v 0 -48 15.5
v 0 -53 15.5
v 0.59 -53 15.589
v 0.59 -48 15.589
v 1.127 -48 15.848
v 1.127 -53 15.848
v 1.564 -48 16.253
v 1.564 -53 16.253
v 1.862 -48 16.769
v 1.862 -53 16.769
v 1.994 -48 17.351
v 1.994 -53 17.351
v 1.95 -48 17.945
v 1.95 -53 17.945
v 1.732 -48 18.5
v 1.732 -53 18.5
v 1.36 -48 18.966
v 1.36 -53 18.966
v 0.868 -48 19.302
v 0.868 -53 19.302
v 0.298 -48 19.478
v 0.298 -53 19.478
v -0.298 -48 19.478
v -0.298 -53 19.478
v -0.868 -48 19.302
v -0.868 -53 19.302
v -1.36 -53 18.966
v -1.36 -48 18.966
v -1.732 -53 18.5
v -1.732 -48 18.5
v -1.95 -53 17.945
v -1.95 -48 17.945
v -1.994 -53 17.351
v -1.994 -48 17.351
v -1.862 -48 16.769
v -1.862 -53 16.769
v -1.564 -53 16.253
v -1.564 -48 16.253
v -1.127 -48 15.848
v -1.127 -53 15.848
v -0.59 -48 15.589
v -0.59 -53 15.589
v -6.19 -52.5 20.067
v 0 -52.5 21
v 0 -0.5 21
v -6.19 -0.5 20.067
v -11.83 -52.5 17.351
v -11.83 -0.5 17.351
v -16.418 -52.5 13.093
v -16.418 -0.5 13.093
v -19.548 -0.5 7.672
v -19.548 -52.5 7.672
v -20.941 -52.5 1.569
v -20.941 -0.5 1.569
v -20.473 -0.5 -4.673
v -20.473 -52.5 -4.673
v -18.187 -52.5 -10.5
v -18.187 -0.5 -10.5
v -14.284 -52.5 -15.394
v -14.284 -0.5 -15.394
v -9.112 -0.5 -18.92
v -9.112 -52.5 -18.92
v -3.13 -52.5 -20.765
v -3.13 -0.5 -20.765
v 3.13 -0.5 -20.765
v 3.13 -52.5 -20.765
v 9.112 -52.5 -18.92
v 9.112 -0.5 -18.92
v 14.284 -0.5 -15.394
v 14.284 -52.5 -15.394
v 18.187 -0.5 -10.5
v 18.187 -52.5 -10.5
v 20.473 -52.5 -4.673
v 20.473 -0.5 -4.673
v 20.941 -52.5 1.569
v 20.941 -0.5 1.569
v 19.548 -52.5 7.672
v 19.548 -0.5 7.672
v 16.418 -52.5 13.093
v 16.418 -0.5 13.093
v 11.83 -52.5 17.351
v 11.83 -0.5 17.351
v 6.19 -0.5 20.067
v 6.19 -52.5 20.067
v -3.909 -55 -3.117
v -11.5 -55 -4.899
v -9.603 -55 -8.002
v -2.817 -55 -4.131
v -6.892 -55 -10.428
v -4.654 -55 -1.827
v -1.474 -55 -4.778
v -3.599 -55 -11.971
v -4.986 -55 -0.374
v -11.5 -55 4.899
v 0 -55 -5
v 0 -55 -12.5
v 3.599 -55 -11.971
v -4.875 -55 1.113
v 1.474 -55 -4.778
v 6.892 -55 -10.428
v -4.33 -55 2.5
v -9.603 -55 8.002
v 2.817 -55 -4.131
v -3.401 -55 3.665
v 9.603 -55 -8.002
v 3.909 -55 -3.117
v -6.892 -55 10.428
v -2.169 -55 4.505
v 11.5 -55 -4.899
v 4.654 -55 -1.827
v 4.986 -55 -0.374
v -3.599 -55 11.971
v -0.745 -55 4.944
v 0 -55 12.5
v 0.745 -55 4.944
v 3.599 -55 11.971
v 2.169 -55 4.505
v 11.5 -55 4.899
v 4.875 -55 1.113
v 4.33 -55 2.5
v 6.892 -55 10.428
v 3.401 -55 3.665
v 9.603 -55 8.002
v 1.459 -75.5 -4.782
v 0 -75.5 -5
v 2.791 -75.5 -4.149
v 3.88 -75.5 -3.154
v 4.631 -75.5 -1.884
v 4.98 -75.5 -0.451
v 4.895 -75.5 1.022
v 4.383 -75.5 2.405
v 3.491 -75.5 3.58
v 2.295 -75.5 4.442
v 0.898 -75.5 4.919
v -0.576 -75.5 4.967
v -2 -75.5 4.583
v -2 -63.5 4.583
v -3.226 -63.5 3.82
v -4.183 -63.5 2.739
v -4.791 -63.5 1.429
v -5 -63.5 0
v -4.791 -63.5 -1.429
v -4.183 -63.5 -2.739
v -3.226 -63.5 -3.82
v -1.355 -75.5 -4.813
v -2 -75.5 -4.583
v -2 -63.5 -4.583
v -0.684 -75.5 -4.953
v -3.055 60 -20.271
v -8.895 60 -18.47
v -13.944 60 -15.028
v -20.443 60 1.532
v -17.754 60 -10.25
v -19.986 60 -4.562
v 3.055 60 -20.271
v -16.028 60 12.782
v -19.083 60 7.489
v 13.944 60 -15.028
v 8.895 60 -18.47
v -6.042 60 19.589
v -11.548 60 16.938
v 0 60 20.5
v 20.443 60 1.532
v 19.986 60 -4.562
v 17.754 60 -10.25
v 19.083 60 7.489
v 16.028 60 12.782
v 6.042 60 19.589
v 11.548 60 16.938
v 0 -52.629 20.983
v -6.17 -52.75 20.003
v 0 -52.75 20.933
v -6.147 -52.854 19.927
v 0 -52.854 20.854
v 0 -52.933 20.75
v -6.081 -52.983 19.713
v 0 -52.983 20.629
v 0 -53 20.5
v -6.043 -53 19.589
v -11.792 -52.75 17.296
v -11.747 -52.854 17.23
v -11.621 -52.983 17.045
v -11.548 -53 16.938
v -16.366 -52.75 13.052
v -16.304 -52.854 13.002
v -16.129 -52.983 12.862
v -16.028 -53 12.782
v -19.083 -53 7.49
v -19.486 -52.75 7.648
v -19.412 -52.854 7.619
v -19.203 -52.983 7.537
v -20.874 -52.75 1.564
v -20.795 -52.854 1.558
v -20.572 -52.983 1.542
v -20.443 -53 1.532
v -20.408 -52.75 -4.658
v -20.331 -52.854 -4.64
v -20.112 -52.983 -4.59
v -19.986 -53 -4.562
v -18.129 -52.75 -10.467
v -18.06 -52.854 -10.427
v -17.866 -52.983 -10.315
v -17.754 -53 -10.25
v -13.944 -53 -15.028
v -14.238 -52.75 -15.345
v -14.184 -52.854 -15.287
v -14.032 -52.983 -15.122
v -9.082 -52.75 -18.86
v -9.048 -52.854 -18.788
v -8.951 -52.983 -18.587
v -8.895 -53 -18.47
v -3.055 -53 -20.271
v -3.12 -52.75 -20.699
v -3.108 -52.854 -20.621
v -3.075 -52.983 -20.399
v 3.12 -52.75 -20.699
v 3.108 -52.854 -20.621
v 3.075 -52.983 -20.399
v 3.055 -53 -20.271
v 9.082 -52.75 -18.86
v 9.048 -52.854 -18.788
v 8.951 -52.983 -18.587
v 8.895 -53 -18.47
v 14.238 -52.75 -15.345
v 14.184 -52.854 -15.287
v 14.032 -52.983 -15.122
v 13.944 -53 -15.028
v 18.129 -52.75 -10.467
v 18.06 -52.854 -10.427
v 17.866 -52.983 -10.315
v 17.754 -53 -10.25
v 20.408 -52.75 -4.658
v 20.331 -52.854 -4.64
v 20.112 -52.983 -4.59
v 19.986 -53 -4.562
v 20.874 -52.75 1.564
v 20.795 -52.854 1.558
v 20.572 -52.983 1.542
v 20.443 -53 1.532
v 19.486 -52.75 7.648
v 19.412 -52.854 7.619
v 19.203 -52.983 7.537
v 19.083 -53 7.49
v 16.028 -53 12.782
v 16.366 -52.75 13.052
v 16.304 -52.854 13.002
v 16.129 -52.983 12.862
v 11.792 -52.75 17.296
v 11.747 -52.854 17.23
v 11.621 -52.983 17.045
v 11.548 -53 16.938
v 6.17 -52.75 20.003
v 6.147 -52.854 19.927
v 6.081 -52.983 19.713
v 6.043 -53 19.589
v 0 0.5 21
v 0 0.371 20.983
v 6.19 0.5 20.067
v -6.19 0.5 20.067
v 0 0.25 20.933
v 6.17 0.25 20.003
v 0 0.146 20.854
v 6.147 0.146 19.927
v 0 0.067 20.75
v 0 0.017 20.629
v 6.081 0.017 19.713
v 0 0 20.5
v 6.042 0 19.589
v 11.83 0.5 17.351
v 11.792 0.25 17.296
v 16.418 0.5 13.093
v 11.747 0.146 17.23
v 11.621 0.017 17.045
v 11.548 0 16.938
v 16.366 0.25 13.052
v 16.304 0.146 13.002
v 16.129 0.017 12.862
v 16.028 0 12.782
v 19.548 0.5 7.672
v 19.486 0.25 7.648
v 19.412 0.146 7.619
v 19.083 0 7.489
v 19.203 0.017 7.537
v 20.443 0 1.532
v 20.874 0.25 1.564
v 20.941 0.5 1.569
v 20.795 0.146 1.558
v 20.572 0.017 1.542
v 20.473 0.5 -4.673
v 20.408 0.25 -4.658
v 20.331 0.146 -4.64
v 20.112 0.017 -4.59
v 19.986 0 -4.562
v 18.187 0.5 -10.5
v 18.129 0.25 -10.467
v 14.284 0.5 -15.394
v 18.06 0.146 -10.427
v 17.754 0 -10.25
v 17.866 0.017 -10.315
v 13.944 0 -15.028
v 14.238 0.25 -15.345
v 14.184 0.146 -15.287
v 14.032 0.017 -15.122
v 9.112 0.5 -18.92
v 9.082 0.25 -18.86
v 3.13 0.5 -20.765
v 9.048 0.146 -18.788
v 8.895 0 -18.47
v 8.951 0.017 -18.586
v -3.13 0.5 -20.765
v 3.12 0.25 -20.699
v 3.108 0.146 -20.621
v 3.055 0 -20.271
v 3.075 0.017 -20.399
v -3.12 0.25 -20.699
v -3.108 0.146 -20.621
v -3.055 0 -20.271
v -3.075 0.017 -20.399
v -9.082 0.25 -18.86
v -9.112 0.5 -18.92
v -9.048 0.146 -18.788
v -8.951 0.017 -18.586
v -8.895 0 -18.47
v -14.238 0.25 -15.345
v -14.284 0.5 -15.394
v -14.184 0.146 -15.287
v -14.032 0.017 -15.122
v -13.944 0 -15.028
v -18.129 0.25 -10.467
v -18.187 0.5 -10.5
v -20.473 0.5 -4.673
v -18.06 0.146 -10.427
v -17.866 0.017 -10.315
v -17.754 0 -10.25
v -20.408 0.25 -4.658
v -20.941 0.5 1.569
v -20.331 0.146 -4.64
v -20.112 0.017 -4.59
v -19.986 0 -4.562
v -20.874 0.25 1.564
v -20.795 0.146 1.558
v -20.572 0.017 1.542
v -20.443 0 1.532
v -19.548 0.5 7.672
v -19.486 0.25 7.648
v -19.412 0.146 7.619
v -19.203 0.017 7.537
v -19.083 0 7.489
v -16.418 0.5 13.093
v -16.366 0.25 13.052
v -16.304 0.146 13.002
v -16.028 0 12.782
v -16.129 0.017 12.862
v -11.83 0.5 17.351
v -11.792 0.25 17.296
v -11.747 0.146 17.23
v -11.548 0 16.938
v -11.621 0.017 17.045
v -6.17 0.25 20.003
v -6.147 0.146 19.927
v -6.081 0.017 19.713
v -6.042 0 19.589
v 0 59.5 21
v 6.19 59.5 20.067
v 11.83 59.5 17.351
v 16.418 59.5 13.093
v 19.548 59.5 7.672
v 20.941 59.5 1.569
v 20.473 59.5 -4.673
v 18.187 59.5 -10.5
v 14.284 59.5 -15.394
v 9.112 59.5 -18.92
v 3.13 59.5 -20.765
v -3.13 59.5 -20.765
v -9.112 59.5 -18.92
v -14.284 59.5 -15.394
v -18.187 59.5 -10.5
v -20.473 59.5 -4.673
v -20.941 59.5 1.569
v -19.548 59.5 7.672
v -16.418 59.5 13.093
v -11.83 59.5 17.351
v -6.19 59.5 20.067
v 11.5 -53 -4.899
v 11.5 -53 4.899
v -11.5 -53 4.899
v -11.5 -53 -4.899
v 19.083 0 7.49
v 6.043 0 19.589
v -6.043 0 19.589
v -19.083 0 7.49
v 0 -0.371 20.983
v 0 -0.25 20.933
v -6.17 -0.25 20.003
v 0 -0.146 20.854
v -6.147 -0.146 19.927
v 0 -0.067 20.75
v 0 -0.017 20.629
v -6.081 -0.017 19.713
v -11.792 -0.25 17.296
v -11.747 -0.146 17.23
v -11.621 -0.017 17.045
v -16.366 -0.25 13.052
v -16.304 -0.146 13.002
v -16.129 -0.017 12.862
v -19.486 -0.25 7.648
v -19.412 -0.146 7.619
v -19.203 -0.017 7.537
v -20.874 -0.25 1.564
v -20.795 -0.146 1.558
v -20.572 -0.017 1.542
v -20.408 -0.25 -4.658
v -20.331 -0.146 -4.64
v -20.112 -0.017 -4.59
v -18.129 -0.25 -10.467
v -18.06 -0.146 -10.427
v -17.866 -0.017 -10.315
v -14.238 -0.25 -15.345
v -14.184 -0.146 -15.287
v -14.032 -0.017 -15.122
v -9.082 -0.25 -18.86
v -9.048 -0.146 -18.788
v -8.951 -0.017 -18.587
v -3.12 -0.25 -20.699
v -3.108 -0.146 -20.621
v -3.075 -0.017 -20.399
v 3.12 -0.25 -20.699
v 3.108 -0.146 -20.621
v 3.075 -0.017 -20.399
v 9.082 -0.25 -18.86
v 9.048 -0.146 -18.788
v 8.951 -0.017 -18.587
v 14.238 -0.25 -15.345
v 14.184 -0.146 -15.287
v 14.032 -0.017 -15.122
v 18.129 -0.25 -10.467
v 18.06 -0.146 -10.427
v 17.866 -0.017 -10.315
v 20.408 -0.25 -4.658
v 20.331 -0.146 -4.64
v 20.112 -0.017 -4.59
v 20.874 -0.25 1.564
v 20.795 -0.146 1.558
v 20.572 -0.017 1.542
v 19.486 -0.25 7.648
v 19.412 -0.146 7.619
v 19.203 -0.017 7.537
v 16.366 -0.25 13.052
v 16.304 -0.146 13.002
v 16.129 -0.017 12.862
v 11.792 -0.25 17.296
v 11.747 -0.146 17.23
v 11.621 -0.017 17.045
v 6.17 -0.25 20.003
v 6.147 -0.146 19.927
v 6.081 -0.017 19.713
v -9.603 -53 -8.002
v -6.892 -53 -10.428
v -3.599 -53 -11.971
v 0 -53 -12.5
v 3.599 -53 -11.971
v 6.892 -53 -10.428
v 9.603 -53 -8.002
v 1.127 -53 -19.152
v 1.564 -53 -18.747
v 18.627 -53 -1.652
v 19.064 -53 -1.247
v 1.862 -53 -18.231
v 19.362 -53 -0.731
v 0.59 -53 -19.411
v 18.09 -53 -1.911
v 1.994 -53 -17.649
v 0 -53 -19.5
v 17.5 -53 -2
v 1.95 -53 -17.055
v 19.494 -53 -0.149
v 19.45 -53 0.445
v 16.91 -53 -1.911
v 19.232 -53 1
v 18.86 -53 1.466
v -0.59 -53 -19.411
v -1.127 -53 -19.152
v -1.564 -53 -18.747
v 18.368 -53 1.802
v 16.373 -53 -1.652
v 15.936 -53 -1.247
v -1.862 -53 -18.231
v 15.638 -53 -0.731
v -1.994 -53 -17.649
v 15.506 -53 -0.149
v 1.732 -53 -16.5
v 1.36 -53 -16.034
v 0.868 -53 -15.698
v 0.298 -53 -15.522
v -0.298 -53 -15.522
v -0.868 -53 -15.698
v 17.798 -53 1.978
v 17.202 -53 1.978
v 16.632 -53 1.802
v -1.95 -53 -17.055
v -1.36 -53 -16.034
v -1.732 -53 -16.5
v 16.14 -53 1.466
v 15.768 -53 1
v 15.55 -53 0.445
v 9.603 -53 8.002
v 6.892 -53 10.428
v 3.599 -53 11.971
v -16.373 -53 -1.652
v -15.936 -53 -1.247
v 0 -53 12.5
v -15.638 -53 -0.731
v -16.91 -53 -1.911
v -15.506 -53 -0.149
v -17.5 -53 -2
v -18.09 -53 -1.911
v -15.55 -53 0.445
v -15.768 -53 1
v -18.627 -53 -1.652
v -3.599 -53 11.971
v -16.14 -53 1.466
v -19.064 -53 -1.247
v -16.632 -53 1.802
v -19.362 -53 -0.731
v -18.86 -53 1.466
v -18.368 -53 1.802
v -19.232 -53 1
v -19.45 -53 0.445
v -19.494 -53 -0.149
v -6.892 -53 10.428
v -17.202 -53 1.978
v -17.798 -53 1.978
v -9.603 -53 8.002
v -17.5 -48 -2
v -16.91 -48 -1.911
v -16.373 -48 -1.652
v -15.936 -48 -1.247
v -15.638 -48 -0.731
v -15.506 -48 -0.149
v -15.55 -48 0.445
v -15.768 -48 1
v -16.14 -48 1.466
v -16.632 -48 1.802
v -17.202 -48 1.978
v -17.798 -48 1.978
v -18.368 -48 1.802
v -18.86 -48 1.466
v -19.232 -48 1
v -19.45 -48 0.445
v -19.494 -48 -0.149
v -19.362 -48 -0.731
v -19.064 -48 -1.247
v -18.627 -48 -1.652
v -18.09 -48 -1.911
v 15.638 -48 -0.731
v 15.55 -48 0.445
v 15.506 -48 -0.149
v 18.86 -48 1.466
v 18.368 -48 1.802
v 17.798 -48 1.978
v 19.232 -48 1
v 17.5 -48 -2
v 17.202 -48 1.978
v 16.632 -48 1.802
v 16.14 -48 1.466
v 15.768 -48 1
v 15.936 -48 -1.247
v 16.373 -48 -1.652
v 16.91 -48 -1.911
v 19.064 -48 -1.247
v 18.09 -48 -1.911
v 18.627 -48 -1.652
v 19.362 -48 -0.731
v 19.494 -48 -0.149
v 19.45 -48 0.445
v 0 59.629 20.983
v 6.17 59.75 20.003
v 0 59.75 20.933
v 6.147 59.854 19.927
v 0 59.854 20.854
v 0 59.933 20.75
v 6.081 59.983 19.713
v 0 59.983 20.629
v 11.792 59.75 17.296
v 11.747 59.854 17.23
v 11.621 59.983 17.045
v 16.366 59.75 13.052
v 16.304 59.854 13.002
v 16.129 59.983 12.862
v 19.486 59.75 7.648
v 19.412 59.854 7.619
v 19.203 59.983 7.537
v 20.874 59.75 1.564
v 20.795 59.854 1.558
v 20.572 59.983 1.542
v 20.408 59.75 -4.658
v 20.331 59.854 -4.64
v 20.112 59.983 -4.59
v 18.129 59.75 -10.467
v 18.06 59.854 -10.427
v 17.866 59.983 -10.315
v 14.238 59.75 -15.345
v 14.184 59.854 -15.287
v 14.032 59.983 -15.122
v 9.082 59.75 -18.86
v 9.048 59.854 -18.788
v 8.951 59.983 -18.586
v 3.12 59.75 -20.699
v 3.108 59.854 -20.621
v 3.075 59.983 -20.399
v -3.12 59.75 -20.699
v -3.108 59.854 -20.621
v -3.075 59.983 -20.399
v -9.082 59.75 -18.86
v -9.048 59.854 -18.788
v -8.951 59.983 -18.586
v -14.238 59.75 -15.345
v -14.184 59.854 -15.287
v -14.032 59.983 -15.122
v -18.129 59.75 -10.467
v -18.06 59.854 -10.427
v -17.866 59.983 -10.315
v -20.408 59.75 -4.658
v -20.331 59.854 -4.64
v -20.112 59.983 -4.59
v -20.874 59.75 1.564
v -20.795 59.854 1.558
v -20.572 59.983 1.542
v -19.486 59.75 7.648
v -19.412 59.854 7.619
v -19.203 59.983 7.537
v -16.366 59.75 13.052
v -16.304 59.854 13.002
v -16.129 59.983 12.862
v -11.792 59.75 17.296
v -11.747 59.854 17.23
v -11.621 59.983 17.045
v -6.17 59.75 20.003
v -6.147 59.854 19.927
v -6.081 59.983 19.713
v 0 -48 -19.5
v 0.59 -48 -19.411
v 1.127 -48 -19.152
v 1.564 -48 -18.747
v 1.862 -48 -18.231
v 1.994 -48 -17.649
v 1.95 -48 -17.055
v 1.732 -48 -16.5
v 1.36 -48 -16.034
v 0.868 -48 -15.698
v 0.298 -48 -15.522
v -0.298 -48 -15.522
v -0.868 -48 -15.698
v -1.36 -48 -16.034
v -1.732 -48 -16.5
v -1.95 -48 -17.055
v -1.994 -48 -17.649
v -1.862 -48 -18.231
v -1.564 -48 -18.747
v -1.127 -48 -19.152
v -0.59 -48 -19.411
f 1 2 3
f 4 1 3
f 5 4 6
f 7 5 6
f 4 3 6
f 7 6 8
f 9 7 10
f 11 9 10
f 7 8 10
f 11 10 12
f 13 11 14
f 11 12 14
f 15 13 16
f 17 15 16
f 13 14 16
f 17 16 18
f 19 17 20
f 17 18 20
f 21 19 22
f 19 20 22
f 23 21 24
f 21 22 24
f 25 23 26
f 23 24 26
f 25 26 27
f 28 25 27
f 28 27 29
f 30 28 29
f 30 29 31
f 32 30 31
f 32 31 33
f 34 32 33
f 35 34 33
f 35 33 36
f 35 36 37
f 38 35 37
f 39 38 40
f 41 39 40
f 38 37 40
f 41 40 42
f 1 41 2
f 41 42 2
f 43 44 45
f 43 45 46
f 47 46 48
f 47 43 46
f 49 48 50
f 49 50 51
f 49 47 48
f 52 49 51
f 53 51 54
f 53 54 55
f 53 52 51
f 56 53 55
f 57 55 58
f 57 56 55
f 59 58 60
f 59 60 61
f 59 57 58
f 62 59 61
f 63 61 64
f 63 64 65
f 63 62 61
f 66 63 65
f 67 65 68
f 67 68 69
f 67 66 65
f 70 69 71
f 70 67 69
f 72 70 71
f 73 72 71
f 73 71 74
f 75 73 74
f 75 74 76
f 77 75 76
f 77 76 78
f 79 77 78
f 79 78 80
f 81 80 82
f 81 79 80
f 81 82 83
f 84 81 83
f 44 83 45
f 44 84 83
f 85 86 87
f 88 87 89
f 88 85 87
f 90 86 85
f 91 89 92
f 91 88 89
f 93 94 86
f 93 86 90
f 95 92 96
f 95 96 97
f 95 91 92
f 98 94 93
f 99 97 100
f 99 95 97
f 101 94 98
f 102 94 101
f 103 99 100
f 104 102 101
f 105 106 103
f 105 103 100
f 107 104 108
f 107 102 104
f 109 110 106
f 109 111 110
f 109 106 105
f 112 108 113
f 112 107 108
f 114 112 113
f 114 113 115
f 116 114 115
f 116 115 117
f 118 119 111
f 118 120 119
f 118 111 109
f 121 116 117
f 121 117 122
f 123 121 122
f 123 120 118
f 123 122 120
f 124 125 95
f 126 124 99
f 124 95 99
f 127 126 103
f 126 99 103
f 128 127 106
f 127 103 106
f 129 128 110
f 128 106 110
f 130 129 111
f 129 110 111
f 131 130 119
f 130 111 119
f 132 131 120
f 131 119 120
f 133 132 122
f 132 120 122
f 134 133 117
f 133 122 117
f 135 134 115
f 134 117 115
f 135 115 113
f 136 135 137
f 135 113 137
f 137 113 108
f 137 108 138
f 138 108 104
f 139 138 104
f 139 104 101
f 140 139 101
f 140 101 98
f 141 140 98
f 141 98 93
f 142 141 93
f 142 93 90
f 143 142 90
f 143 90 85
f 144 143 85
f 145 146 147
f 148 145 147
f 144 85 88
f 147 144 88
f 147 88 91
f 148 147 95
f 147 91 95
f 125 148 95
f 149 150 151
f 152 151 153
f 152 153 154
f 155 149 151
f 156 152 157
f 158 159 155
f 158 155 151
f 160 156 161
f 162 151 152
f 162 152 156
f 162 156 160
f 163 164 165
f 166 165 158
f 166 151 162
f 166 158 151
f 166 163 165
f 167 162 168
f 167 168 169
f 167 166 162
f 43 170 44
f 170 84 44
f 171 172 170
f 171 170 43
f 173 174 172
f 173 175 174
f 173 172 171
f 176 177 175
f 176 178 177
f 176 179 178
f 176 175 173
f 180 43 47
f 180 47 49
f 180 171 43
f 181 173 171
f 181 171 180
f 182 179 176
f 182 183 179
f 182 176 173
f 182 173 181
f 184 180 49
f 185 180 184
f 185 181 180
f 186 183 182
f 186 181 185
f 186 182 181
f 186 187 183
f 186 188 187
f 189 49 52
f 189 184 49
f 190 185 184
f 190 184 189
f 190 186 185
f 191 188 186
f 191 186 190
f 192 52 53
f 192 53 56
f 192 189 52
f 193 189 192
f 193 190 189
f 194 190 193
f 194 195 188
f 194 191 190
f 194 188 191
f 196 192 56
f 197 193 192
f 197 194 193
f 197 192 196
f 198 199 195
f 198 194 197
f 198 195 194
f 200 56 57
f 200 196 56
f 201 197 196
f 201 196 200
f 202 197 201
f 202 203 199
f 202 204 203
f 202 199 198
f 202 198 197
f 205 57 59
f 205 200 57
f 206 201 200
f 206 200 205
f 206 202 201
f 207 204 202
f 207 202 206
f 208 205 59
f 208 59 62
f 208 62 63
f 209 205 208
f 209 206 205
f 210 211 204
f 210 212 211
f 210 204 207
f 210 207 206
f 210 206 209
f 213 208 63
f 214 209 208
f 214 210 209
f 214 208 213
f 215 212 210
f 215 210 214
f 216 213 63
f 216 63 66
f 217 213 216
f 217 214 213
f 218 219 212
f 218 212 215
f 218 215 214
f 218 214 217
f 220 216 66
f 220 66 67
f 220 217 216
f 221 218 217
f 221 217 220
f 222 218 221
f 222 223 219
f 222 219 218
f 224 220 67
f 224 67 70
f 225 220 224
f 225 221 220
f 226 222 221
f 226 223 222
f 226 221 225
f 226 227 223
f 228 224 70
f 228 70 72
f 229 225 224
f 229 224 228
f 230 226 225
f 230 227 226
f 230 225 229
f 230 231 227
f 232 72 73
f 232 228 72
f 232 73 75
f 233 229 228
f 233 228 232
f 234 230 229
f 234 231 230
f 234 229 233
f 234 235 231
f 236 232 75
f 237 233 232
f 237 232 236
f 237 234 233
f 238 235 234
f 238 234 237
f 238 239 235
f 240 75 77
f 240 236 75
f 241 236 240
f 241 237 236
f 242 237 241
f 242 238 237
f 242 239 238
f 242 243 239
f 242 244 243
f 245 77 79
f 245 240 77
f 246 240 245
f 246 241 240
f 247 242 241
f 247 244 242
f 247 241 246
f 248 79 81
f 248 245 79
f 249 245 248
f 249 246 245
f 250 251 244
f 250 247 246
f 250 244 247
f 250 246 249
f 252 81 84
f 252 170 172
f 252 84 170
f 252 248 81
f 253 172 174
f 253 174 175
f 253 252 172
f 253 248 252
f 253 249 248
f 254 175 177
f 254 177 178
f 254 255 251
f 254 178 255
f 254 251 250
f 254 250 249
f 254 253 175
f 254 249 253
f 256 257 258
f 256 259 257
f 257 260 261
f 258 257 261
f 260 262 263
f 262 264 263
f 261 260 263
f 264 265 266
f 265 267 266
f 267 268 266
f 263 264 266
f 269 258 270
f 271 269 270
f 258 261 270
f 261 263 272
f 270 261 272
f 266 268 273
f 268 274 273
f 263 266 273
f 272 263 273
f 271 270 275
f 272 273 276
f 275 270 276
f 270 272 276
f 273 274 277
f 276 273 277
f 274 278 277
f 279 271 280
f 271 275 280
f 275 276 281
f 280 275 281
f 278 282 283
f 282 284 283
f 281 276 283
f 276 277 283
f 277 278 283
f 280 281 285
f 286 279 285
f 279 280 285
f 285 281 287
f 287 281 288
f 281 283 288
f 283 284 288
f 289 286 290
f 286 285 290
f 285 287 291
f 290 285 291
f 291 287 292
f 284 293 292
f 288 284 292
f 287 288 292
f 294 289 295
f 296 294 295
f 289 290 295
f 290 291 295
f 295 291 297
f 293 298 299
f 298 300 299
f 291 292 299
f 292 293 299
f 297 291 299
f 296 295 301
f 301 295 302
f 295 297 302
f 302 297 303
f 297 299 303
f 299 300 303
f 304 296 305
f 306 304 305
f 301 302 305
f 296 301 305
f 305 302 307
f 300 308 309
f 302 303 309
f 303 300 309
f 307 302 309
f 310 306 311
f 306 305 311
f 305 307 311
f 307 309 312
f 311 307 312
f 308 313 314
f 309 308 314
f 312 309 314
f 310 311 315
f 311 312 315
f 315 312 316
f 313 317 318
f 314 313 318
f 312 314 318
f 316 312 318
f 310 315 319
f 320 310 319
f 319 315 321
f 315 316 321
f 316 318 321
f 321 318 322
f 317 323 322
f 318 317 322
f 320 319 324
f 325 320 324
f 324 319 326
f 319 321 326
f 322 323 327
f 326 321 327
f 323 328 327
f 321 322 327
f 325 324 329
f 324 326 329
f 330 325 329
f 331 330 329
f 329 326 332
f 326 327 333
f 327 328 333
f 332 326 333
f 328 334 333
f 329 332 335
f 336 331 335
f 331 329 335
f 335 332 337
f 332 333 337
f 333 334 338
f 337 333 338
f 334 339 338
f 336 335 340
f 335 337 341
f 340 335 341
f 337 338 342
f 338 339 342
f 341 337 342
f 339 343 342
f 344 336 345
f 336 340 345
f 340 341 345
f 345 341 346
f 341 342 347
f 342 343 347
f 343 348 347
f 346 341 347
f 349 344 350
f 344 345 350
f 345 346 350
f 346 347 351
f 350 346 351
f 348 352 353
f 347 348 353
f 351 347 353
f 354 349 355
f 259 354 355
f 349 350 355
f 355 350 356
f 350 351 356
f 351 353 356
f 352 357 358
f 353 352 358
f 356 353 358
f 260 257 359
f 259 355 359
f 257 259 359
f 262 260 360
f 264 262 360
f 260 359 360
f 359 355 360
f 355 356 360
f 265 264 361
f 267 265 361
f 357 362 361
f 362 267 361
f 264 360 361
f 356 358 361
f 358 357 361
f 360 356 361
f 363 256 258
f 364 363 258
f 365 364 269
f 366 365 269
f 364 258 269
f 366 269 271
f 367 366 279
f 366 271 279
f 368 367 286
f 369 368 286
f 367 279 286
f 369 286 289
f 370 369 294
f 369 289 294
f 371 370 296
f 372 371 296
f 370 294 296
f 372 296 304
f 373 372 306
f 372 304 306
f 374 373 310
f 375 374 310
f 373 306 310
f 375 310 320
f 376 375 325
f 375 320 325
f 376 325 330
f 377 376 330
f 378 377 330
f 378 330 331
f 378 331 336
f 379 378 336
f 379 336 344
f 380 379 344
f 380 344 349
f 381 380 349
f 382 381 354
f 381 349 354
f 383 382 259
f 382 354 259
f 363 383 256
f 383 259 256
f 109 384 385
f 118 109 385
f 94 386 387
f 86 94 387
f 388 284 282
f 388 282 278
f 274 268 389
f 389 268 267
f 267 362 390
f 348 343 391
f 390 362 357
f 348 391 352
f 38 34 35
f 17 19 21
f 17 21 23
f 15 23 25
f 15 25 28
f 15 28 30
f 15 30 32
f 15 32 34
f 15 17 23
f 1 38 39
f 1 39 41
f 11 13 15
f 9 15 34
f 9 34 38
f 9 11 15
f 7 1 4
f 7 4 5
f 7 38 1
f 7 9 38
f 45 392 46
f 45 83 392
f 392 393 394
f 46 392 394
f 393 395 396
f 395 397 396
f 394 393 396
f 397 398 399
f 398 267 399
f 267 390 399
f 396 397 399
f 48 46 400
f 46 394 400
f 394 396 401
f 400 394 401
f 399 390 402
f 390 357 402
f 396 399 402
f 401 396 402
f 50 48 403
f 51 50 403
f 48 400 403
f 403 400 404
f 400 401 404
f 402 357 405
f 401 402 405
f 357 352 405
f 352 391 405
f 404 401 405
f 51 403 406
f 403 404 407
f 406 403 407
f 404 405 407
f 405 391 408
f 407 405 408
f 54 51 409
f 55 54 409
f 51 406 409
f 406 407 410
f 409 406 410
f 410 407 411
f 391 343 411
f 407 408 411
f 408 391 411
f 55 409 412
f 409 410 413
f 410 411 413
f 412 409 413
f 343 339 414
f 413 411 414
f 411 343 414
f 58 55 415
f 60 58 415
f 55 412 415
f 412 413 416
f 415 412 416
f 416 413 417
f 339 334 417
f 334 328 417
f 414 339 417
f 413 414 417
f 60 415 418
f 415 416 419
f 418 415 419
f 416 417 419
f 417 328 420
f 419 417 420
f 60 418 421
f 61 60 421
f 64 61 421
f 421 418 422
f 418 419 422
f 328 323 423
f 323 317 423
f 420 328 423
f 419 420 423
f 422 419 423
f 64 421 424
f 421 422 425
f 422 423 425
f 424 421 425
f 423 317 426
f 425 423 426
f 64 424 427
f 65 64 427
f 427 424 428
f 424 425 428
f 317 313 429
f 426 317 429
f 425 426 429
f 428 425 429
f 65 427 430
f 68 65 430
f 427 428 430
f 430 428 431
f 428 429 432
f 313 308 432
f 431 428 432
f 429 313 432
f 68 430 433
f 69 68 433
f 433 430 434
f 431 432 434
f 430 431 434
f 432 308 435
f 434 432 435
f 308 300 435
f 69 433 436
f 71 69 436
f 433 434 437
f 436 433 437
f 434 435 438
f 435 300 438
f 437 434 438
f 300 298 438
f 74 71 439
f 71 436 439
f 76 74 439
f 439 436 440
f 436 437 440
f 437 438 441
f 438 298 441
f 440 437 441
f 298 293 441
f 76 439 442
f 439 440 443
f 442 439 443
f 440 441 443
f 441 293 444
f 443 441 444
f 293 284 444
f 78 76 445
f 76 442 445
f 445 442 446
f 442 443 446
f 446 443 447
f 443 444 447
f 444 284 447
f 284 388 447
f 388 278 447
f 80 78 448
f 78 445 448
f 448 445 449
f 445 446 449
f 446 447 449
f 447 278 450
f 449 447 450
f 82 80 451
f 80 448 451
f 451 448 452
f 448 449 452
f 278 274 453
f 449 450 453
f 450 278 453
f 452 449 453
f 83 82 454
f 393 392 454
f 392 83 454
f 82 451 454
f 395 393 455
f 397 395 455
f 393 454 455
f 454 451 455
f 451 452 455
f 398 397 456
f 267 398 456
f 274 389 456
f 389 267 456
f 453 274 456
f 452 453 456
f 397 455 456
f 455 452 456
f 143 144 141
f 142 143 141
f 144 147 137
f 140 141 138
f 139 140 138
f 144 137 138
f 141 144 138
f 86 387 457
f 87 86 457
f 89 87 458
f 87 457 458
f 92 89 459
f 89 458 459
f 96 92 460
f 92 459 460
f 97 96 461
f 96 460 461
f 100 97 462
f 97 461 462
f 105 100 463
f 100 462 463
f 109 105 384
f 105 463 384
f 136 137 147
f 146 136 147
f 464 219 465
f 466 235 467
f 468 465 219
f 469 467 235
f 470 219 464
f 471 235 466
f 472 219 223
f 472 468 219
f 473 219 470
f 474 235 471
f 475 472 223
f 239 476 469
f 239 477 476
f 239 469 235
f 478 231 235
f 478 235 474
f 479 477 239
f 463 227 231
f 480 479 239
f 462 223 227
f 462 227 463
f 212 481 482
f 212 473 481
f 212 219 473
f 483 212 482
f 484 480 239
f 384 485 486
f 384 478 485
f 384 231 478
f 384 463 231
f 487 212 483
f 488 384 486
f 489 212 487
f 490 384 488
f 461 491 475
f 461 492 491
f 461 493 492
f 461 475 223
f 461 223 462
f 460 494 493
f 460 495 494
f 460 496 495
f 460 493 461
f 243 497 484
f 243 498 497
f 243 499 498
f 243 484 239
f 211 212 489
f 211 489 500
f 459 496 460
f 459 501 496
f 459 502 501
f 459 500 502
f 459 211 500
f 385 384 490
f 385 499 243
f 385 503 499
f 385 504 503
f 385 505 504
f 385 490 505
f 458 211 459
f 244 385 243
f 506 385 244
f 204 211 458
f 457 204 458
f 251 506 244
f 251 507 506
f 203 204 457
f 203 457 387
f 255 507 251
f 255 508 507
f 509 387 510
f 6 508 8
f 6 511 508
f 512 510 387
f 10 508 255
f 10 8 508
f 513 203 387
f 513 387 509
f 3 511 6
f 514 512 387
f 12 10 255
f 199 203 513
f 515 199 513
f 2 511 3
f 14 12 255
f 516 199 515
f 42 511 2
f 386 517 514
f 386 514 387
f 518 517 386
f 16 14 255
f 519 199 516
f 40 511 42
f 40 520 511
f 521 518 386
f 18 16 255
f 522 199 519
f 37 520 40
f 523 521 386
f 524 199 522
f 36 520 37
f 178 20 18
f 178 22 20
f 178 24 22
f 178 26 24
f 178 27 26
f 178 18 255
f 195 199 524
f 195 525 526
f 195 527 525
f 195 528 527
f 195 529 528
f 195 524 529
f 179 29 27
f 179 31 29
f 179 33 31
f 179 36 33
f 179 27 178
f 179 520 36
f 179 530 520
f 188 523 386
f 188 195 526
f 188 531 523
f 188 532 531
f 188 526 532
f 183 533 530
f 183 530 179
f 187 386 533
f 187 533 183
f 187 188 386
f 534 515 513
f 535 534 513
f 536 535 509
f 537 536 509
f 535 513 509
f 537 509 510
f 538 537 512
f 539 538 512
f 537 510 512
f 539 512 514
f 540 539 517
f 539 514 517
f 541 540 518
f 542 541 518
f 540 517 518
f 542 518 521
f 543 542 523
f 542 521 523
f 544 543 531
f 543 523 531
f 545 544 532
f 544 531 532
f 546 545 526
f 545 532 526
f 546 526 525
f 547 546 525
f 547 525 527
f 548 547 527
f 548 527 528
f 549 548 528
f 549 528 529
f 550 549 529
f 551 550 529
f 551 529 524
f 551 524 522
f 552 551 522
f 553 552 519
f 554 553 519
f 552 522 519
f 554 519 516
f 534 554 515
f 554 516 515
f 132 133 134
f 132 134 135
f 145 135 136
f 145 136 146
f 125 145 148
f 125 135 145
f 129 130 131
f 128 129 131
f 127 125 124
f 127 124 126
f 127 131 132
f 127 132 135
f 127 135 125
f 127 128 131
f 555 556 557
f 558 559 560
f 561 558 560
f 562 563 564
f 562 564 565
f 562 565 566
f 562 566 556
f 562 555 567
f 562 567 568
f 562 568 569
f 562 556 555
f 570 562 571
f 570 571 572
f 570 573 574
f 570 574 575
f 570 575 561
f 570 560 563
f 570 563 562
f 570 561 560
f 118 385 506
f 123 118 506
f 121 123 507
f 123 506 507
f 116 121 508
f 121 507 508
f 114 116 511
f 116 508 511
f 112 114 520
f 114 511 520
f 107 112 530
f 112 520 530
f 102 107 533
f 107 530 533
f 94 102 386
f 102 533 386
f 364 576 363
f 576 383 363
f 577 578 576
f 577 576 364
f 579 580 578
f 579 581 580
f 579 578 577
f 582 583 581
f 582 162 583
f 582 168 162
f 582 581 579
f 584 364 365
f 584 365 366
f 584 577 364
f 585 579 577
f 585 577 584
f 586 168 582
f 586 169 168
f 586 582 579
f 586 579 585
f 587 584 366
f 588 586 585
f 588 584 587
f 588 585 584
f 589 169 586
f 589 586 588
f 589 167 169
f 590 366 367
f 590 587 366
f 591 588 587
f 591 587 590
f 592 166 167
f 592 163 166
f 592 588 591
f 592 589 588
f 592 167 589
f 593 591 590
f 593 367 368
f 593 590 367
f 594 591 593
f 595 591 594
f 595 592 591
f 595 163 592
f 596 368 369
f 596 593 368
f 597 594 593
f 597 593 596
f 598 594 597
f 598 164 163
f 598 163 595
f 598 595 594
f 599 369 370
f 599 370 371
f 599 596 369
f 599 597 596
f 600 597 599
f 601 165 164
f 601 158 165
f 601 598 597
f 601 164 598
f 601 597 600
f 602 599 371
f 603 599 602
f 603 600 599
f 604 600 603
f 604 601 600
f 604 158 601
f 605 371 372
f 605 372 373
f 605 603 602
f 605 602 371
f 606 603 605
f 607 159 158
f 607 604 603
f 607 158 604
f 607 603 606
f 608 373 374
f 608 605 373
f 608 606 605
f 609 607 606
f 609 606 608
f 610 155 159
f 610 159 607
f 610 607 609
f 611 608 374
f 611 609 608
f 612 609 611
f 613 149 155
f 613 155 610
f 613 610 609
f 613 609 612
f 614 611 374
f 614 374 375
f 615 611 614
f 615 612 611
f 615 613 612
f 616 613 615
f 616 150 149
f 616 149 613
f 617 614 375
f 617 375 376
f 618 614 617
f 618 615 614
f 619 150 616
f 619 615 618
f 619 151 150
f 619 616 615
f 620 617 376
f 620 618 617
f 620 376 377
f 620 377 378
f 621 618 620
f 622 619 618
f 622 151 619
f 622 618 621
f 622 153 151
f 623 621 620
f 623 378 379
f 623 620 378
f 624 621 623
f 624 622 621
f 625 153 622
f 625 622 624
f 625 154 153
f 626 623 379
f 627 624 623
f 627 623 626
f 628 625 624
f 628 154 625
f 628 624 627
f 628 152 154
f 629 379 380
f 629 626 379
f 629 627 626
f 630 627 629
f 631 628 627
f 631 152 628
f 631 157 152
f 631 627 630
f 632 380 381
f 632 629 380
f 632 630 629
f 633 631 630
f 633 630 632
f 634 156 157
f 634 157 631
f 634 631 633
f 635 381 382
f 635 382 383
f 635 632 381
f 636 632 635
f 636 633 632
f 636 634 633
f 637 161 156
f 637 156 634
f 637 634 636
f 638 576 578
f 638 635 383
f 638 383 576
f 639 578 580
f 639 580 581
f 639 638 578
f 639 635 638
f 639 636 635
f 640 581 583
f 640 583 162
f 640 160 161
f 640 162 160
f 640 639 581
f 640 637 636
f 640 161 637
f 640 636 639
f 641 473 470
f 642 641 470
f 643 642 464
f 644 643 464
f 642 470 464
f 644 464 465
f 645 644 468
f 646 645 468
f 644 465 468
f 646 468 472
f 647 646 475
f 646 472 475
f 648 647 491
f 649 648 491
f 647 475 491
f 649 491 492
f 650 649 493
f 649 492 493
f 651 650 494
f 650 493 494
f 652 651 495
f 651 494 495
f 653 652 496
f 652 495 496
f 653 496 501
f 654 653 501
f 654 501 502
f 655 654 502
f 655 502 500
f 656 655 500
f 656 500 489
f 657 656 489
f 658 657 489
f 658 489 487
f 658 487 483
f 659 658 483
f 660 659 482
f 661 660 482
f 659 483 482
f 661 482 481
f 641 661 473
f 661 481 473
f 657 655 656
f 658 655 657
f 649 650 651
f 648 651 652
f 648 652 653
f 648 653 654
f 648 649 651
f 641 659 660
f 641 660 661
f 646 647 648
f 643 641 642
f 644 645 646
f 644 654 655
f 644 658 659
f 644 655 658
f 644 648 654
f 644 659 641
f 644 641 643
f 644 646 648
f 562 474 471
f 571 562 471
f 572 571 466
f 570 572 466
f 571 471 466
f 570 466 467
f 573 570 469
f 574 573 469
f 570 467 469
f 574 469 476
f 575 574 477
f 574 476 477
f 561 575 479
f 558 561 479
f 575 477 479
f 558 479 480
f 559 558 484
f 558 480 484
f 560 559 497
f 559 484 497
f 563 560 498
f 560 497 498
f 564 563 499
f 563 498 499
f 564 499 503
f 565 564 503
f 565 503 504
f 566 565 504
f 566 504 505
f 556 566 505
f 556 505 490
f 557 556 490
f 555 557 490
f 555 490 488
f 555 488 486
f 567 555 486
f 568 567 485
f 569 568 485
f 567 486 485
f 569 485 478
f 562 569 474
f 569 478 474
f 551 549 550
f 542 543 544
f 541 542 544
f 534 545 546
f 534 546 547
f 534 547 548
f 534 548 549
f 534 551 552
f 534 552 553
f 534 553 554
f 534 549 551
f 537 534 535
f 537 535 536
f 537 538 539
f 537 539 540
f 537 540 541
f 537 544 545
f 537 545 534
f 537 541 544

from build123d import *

# Parameters (mm, degrees)
CROQUIS1_R              = 21
SALIENTE_EXTRUIR1_DEPTH = 60
REDONDEO1_R             = 0.5
SALIENTE_EXTRUIR2_START = 53
CROQUIS2_R              = 21
SALIENTE_EXTRUIR2_DEPTH = 53
REDONDEO2_R             = 0.5
SALIENTE_EXTRUIR3_DEPTH = 2
CROQUIS4_R              = 5
SALIENTE_EXTRUIR4_DEPTH = 20.5
CORTAR_EXTRUIR1_START   = -12
CORTAR_EXTRUIR1_DEPTH   = 12
CROQUIS6_R              = 2
CORTAR_EXTRUIR2_DEPTH   = 5


with BuildPart() as part:
    # Croquis1 → Saliente-Extruir1 (new body)
    with BuildSketch(Plane(origin=(0, 0, 0), x_dir=(1, 0, 0), z_dir=(0, 1, 0))):
        with Locations(Location((0, 0, 0), (0, 0, 270))):
            Circle(CROQUIS1_R)
    extrude(amount=SALIENTE_EXTRUIR1_DEPTH)

    # Redondeo1
    redondeo1_edges = [part.edges().sort_by_distance(p)[0] for p in [
        (0, 0, -21),
        (0, 60, -21),
    ]]
    fillet(redondeo1_edges, radius=REDONDEO1_R)

    # Croquis2 → Saliente-Extruir2 (add)
    with BuildSketch(Plane.XZ.offset(SALIENTE_EXTRUIR2_START)):
        with Locations(Location((0, 0, 0), (0, 0, 90))):
            Circle(CROQUIS2_R)
    extrude(amount=-SALIENTE_EXTRUIR2_DEPTH)

    # Redondeo2
    redondeo2_edges = [part.edges().sort_by_distance(p)[0] for p in [
        (0, 0, -21),
        (0, -53, -21),
    ]]
    fillet(redondeo2_edges, radius=REDONDEO2_R - 0.0001)  # a hair under: the kernel refuses the full size

    # Croquis3 → Saliente-Extruir3 (add)
    with BuildSketch(Plane.XZ.offset(53)):
        with BuildLine():
            Line((11.5, -4.898979486), (11.5, 4.898979486))
            ThreePointArc((11.5, 4.898979486), (0, 12.5), (-11.5, 4.898979486))
            Line((-11.5, 4.898979486), (-11.5, -4.898979486))
            ThreePointArc((-11.5, -4.898979486), (0, -12.5), (11.5, -4.898979486))
        make_face()
    extrude(amount=SALIENTE_EXTRUIR3_DEPTH)

    # Croquis4 → Saliente-Extruir4 (add)
    with BuildSketch(Plane.XZ.offset(55)):
        with Locations(Location((0, 0, 0), (0, 0, 270))):
            Circle(CROQUIS4_R)
    extrude(amount=SALIENTE_EXTRUIR4_DEPTH)

    # Croquis5 → Cortar-Extruir1 (cut)
    with BuildSketch(Plane.XZ.offset(75.5).offset(CORTAR_EXTRUIR1_START)):
        with BuildLine():
            Line((-2, 4.582575695), (-2, -4.582575695))
            ThreePointArc((-2, -4.582575695), (-5, 0), (-2, 4.582575695))
        make_face()
    extrude(amount=CORTAR_EXTRUIR1_DEPTH, mode=Mode.SUBTRACT)

    # Croquis6 → Cortar-Extruir2 (cut)
    with BuildSketch(Plane.XZ.offset(53)):
        with Locations(Location((-17.5, 0, 0), (0, 0, 270))):
            Circle(CROQUIS6_R)
        with Locations(Location((0, 17.5, 0), (0, 0, 270))):
            Circle(CROQUIS6_R)
        with Locations(Location((17.5, 0, 0), (0, 0, 270))):
            Circle(CROQUIS6_R)
        with Locations(Location((0, -17.5, 0), (0, 0, 270))):
            Circle(CROQUIS6_R)
    extrude(amount=-CORTAR_EXTRUIR2_DEPTH, mode=Mode.SUBTRACT)


solid = part.part
